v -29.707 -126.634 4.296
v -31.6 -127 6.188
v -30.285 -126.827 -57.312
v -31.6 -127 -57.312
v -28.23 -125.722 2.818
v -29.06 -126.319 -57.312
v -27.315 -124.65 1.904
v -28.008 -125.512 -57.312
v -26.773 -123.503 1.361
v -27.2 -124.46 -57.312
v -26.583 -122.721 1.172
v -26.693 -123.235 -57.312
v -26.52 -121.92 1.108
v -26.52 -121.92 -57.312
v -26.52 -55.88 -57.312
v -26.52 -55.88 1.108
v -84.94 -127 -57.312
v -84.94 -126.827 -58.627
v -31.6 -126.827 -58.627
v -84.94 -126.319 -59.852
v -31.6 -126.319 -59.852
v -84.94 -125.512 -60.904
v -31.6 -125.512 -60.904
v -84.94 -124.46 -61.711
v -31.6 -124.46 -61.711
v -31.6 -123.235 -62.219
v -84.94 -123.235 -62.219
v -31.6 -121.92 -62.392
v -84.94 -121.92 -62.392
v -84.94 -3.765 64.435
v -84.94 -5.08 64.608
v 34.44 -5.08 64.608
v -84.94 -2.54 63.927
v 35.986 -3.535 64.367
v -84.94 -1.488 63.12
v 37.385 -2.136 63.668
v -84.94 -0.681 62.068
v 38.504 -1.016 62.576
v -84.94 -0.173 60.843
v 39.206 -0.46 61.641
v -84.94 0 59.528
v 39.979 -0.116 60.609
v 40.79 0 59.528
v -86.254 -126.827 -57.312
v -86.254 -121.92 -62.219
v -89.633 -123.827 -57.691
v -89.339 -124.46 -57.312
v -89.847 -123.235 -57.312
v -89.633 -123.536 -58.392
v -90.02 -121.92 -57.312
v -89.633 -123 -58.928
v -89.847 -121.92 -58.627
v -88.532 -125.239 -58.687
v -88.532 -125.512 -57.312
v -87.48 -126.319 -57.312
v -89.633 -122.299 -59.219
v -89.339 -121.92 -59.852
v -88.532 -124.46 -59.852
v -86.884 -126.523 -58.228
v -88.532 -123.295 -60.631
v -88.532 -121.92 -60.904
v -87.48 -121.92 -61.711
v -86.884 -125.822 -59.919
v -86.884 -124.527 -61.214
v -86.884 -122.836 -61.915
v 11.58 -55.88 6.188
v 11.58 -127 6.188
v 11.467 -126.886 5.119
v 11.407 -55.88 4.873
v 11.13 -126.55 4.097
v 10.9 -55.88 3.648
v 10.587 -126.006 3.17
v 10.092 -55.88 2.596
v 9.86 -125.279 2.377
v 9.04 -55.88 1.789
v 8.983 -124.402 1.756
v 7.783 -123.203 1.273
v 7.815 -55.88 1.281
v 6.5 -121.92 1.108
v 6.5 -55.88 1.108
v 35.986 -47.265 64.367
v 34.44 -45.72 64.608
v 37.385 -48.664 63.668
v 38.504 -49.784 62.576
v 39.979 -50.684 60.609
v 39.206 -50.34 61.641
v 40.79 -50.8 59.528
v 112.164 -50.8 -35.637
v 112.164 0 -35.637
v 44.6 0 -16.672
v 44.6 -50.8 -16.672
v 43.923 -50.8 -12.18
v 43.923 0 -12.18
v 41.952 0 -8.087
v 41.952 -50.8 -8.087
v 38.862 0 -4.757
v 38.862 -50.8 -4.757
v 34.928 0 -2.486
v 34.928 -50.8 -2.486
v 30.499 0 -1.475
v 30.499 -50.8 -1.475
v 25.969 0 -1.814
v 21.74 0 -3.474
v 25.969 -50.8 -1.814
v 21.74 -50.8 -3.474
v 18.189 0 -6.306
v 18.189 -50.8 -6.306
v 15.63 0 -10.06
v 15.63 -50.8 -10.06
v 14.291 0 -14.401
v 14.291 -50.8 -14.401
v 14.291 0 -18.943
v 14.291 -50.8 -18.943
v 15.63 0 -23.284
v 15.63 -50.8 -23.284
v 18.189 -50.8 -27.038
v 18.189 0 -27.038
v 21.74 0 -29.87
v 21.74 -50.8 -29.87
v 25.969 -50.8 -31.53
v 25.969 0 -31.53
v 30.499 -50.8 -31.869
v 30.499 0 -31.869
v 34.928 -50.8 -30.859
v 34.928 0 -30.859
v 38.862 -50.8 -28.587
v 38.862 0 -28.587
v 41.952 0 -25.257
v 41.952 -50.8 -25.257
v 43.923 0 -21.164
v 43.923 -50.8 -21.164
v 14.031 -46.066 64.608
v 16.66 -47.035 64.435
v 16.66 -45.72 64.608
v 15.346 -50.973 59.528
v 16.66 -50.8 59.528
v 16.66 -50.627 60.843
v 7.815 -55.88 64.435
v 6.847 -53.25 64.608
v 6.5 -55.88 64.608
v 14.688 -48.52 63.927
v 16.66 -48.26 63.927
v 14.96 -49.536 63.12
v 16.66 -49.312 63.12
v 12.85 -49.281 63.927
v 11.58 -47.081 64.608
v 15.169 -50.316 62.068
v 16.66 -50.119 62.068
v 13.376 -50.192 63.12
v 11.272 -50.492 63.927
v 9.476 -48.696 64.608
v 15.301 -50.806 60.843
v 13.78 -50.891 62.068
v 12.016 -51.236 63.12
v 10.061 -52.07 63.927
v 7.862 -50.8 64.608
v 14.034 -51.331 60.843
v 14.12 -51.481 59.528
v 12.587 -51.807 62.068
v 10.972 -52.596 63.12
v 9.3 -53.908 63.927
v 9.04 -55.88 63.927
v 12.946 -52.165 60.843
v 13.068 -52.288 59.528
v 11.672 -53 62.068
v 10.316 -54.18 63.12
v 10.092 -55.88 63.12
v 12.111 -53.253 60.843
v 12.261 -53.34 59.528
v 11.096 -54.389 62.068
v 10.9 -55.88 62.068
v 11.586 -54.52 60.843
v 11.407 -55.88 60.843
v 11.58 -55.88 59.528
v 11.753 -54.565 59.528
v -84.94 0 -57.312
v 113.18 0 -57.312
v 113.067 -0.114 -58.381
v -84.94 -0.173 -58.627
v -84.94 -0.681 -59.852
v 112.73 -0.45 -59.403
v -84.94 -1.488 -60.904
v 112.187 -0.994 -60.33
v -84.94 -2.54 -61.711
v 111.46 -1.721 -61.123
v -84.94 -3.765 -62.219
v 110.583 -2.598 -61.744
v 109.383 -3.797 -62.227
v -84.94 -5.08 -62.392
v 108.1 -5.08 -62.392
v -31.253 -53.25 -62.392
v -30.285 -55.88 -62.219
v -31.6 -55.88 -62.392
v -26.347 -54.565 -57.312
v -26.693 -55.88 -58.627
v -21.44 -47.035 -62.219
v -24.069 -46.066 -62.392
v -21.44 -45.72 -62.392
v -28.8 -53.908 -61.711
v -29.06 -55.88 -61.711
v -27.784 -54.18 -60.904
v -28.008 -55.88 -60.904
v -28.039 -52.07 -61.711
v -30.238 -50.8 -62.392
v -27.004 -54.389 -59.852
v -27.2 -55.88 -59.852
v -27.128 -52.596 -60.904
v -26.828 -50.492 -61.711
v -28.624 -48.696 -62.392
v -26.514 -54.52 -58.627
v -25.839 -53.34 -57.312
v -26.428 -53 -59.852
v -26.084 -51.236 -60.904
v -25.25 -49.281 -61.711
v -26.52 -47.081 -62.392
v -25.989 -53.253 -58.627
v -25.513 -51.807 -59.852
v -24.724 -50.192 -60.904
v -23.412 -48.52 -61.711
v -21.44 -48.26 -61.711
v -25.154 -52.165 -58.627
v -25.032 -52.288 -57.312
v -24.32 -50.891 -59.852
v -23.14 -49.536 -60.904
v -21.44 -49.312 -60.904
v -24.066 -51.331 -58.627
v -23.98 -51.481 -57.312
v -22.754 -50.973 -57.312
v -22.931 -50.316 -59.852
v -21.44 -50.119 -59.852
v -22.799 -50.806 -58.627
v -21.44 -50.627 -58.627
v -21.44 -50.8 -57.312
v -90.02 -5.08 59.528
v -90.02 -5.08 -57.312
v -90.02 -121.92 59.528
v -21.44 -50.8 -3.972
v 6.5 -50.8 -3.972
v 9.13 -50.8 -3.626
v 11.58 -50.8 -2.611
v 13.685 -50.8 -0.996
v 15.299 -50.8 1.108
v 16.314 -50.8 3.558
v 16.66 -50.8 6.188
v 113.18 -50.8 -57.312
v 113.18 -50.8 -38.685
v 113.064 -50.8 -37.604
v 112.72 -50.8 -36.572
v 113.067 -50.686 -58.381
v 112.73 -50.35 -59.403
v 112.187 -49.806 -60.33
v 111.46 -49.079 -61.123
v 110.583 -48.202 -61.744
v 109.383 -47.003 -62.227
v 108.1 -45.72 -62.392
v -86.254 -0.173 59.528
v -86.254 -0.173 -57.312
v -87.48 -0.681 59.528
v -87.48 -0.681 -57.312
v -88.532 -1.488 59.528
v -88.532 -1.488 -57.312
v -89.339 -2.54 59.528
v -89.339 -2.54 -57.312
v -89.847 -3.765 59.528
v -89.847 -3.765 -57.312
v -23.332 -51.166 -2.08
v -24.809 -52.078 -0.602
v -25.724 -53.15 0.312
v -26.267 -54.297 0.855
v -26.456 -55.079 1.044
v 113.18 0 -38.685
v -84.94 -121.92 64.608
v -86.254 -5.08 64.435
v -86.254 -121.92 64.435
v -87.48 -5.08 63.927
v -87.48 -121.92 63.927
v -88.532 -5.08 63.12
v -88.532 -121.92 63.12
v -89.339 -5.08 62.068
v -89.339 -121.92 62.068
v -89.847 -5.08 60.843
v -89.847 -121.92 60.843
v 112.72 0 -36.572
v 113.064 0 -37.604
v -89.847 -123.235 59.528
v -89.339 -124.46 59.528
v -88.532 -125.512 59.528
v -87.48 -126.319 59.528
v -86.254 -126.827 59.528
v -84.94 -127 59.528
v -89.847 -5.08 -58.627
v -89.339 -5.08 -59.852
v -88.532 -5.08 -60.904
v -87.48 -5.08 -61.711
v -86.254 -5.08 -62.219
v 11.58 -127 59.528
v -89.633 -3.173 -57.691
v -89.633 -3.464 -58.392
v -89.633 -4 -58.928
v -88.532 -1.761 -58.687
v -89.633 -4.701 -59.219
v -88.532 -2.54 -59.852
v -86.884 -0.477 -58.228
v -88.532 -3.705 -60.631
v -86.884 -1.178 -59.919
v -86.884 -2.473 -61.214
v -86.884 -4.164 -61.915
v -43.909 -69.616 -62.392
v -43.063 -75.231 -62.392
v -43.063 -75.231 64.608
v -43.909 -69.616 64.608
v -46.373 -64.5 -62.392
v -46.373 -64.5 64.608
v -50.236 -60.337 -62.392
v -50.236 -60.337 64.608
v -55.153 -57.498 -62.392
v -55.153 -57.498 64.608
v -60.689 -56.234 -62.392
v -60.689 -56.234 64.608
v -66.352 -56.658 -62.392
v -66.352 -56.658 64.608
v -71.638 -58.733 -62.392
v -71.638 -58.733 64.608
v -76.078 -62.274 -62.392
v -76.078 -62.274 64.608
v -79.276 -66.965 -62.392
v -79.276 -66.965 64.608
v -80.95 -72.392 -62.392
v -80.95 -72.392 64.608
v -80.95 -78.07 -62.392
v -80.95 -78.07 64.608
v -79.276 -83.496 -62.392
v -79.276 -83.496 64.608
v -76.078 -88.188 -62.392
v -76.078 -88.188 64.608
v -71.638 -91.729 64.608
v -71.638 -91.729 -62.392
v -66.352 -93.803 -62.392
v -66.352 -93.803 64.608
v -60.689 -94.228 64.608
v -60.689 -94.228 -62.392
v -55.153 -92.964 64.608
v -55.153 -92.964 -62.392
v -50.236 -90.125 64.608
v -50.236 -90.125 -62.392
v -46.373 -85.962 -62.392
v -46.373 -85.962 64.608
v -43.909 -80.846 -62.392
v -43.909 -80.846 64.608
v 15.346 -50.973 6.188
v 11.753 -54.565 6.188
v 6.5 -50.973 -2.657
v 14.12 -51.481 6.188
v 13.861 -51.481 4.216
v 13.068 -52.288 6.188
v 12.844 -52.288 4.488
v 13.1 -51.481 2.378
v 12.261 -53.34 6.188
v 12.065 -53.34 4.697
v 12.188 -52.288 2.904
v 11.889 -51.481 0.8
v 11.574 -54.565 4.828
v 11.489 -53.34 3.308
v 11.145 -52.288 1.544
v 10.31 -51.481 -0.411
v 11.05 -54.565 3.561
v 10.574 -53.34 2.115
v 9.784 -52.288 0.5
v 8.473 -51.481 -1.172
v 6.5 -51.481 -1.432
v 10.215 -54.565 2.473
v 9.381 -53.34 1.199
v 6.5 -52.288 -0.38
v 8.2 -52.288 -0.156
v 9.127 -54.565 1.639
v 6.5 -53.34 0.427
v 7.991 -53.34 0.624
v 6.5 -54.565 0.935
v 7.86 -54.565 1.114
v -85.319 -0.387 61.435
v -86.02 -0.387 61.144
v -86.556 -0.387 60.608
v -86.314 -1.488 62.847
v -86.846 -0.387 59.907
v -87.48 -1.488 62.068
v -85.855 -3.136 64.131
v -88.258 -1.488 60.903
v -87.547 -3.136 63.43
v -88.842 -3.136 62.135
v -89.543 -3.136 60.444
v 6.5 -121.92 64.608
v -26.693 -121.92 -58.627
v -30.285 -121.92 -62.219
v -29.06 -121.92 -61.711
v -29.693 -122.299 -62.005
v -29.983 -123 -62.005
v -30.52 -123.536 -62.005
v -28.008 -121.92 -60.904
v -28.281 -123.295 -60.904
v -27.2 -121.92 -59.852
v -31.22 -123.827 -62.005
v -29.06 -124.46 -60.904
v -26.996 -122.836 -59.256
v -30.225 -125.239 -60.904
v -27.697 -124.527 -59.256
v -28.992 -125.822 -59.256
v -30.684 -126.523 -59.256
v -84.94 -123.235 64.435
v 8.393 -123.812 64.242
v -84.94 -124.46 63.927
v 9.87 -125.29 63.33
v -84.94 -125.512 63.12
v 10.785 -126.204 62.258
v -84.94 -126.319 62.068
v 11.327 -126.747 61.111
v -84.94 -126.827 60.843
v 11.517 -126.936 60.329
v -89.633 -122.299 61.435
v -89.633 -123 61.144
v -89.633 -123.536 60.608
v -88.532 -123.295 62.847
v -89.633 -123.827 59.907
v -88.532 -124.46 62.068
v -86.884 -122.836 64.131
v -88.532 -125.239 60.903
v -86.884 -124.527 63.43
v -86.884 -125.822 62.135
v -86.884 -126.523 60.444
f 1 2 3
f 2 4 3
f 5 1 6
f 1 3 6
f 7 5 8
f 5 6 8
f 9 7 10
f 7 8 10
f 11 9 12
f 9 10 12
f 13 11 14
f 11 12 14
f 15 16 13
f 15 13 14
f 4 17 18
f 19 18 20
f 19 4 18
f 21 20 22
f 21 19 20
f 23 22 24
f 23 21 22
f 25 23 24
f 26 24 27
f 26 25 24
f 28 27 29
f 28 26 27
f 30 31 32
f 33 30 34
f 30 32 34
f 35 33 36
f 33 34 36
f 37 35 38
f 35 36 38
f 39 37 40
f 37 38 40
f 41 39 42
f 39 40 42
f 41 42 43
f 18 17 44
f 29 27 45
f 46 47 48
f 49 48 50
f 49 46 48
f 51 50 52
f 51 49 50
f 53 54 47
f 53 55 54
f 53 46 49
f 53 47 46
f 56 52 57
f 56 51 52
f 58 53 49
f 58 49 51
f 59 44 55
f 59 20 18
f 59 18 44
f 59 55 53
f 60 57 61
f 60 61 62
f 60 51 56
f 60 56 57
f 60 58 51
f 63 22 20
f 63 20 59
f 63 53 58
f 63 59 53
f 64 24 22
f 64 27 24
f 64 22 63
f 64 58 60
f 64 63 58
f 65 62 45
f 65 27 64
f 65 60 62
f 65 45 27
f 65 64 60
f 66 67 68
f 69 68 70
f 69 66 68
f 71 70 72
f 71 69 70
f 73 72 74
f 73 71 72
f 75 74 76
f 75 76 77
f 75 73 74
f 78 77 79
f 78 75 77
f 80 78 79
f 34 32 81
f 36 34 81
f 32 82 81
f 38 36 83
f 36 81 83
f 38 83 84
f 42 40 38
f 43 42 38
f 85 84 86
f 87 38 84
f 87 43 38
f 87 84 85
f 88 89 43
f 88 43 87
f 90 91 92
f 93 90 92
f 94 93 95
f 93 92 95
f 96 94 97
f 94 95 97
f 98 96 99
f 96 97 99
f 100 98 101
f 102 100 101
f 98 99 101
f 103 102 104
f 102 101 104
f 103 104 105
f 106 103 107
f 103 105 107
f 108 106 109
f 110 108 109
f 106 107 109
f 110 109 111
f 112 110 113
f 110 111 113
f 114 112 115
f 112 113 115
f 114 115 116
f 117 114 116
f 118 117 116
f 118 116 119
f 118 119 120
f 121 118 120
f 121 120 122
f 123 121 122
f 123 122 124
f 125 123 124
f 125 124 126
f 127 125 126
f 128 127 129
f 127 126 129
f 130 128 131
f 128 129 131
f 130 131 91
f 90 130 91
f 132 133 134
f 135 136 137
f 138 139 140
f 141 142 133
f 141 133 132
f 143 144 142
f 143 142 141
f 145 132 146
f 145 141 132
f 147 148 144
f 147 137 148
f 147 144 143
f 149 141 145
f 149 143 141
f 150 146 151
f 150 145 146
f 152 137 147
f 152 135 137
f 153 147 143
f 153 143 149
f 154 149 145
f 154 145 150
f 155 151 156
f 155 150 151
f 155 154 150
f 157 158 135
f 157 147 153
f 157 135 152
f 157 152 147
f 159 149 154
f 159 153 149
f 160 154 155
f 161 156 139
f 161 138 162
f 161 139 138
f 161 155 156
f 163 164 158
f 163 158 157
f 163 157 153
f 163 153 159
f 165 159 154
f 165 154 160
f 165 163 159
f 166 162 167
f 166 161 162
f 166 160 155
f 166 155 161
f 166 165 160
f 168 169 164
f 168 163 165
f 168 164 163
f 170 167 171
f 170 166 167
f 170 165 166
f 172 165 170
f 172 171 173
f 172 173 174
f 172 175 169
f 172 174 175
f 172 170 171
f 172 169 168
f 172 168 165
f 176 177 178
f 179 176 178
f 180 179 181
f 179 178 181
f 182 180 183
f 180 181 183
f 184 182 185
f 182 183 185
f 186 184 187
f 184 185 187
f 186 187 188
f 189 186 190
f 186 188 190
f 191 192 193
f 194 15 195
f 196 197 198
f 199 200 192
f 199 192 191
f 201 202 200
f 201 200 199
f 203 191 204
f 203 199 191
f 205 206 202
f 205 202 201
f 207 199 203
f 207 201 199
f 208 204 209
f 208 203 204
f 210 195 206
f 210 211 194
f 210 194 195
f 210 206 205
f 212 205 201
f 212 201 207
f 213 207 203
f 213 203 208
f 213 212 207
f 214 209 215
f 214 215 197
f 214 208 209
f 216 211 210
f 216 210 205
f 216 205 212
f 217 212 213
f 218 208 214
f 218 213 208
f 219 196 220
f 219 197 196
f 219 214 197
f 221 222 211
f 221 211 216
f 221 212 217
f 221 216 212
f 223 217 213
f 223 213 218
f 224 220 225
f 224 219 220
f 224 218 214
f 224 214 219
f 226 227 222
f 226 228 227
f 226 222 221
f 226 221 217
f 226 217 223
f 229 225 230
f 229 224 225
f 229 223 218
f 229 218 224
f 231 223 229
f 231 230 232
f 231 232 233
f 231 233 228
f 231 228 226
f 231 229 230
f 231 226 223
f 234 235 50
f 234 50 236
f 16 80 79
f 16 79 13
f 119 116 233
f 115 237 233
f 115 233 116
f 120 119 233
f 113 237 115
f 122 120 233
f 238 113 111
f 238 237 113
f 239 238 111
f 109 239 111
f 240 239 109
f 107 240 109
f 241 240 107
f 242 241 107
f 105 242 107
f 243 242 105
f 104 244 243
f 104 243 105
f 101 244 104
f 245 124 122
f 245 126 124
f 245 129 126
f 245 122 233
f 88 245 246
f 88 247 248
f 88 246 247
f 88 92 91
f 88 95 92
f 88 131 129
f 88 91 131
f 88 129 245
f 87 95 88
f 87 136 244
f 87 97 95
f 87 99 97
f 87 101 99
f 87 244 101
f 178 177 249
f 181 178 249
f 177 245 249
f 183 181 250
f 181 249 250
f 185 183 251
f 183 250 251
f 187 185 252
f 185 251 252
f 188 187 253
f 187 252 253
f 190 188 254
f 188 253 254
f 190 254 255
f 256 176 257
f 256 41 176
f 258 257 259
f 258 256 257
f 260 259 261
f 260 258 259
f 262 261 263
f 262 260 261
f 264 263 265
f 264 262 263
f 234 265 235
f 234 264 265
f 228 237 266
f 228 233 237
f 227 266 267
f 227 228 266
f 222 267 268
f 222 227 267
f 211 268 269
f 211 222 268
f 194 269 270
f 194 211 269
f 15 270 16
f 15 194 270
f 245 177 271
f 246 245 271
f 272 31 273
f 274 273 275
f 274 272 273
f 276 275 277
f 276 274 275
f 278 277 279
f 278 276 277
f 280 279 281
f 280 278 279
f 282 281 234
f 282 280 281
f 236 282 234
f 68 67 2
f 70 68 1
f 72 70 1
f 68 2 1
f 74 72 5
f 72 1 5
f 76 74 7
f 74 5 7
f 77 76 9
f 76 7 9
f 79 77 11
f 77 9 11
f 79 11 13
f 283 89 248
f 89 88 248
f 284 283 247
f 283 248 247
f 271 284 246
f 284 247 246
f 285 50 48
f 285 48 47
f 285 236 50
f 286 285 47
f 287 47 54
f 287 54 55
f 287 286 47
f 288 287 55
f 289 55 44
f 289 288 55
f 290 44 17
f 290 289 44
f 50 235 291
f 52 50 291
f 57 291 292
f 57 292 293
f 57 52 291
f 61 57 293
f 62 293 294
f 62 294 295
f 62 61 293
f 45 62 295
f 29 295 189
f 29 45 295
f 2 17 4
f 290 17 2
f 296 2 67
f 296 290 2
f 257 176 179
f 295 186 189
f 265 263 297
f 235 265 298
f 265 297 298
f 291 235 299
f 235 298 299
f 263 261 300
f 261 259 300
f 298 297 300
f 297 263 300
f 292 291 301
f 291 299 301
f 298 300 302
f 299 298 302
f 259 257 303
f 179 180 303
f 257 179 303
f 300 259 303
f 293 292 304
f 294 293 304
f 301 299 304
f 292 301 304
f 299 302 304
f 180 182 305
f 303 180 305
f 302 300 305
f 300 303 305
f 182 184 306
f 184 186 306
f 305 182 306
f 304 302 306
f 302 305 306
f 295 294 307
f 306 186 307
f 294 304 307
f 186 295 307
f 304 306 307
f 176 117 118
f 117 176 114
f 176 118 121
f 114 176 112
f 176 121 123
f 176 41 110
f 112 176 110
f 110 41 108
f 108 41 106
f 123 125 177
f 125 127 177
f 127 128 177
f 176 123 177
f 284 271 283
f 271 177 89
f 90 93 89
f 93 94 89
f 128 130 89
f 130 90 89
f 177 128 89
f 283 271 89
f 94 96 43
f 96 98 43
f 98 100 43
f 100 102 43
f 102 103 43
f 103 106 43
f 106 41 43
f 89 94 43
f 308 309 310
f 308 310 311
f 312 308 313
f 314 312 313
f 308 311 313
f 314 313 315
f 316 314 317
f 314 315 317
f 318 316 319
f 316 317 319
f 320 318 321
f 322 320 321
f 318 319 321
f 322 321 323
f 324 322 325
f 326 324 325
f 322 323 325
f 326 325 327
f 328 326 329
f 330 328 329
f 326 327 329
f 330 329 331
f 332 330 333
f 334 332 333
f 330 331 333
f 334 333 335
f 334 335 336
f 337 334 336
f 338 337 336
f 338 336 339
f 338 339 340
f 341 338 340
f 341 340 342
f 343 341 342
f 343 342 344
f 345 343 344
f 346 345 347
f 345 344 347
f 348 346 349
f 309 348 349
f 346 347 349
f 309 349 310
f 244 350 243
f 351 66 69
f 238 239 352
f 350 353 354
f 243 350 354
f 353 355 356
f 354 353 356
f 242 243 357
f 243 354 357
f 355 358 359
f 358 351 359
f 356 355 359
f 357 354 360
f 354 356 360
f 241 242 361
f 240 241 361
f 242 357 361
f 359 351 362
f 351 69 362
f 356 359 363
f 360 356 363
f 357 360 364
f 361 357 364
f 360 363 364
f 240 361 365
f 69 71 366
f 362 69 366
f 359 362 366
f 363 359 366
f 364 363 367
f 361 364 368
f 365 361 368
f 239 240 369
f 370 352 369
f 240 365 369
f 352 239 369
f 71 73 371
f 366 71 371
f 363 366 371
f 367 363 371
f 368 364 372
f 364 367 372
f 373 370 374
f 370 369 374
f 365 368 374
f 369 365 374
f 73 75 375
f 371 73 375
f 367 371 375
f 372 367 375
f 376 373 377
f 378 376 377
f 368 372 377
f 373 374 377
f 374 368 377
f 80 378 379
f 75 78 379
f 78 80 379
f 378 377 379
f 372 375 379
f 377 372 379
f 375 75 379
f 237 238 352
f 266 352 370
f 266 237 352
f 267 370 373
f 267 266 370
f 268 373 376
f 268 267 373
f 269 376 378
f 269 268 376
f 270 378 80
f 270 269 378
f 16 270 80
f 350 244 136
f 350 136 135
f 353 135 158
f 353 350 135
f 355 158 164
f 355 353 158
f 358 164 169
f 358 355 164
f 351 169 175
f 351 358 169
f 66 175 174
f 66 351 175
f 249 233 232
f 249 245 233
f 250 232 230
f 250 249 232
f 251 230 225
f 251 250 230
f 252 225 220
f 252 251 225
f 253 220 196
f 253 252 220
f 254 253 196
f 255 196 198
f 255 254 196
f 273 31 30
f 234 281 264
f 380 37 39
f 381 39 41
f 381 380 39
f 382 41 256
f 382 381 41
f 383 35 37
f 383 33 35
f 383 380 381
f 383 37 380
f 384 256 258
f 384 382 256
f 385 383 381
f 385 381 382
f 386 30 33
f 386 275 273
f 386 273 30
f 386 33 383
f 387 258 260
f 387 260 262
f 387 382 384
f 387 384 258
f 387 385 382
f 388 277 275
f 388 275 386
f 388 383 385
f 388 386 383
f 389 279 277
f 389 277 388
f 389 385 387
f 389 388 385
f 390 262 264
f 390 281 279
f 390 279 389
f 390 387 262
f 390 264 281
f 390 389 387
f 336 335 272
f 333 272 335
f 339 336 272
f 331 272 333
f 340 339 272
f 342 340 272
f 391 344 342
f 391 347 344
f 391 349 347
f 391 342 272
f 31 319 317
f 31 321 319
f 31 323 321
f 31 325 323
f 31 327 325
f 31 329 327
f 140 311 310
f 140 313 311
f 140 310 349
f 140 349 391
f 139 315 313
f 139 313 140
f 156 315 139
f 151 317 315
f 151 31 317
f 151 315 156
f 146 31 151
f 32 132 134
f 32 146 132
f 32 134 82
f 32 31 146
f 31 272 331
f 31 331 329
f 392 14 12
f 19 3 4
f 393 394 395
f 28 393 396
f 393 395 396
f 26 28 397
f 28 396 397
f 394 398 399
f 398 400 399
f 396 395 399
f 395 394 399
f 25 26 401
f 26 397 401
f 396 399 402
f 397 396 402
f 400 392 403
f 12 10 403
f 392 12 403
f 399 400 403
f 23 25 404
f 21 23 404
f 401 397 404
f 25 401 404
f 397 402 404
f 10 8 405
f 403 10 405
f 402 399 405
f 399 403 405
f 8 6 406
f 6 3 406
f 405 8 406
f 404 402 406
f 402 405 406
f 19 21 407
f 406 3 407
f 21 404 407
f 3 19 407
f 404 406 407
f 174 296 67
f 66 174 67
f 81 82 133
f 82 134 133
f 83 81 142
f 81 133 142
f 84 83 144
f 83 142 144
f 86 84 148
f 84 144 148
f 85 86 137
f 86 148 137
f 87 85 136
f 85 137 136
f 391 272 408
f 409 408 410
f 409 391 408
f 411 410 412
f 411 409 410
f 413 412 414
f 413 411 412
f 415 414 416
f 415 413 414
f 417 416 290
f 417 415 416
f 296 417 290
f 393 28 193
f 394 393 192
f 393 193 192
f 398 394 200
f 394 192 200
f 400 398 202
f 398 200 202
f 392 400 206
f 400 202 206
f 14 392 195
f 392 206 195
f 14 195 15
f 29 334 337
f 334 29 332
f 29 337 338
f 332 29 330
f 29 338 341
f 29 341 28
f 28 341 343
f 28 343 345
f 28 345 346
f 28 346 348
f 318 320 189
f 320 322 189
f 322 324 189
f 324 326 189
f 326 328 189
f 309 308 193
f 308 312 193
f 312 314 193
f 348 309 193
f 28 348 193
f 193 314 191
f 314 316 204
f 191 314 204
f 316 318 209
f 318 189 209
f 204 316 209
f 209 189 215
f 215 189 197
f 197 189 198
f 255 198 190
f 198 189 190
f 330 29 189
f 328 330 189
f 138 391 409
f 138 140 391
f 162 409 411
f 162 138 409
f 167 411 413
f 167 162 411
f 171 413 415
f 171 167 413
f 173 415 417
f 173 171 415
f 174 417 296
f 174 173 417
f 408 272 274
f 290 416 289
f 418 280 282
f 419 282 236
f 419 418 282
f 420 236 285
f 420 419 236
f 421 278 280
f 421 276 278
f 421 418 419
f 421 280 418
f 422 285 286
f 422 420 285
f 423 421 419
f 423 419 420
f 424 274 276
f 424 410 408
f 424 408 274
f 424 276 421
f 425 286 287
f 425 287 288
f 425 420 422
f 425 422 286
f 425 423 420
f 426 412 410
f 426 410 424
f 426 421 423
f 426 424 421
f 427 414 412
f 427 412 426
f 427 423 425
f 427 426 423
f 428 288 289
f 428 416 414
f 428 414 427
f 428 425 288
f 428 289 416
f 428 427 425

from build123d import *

# Parameters (mm, degrees)
F0_W     = 203.2
F0_H     = 127
F1_DEPTH = 127
F3_DEPTH = 76.2
F4_SIZE2 = 101.6
F4_SIZE  = 76.2
F5_R     = 5.08
F6_R     = 15.24
F7_DEPTH = 50.8
F8_R     = 19.05
F9_DEPTH = 127


with BuildPart() as f1:
    # F0 (on Front) → F1 (new body)
    with BuildSketch(Plane.XZ):
        with Locations((11.5803908557, 1.1079770926)):
            Rectangle(F0_W, F0_H)
    extrude(amount=F1_DEPTH)

    # F2 (on face) → F3 (cut)
    with BuildSketch(Plane.XZ.offset(127)):
        Polygon((-26.5196091443, 1.1079770926), (-26.5196091443, -62.3920229074), (113.1803908557, -62.3920229074), (113.1803908557, 64.6079770926), (11.5803908557, 64.6079770926), (11.5803908557, 1.1079770926), align=None)
    extrude(amount=-F3_DEPTH, mode=Mode.SUBTRACT)

    # F4
    f4_edges = [f1.edges().sort_by_distance(p)[0] for p in [
        (113.180391, -25.4, 64.607977),
    ]]
    f4_side = f1.faces().sort_by_distance((-10.191038, -52.614286, 64.607977))[0]
    chamfer(f4_edges, length=F4_SIZE, length2=F4_SIZE2, reference=f4_side)

    # F5
    f5_edges = [f1.edges().sort_by_distance(p)[0] for p in [
        (11.580391, -88.9, 64.607977),
        (11.580391, -88.9, 1.107977),
        (11.580391, -50.8, 32.857977),
        (-26.519609, -50.8, -30.642023),
        (-26.519609, -127, -30.642023),
        (-26.519609, -88.9, -62.392023),
        (-7.469609, -127, 1.107977),
        (-39.219609, -127, 64.607977),
        (-90.019609, -63.5, 64.607977),
        (-26.519609, 0, 64.607977),
        (-58.269609, -127, -62.392023),
        (-90.019609, -127, 1.107977),
        (43.330391, -50.8, -62.392023),
        (113.180391, -25.4, -62.392023),
        (36.980391, -25.4, 64.607977),
        (113.180391, -25.4, -36.992023),
        (11.580391, 0, -62.392023),
        (-90.019609, 0, 1.107977),
        (-90.019609, -63.5, -62.392023),
        (24.280391, -50.8, 64.607977),
        (-7.469609, -50.8, 1.107977),
    ]]
    fillet(f5_edges, radius=F5_R)

    # F6 (on face) → F7 (cut, through all)
    with BuildSketch(Plane.XZ.offset(50.8)):
        with Locations((29.3603908557, -16.6720229074)):
            Circle(F6_R)
    extrude(amount=-F7_DEPTH, mode=Mode.SUBTRACT)

    # F8 (on face) → F9 (cut)
    with BuildSketch(Plane.XY.offset(64.6079770926)):
        with Locations((-62.1130280197, -75.2307921648)):
            Circle(F8_R)
    extrude(amount=-F9_DEPTH, mode=Mode.SUBTRACT)


solid = f1.part
